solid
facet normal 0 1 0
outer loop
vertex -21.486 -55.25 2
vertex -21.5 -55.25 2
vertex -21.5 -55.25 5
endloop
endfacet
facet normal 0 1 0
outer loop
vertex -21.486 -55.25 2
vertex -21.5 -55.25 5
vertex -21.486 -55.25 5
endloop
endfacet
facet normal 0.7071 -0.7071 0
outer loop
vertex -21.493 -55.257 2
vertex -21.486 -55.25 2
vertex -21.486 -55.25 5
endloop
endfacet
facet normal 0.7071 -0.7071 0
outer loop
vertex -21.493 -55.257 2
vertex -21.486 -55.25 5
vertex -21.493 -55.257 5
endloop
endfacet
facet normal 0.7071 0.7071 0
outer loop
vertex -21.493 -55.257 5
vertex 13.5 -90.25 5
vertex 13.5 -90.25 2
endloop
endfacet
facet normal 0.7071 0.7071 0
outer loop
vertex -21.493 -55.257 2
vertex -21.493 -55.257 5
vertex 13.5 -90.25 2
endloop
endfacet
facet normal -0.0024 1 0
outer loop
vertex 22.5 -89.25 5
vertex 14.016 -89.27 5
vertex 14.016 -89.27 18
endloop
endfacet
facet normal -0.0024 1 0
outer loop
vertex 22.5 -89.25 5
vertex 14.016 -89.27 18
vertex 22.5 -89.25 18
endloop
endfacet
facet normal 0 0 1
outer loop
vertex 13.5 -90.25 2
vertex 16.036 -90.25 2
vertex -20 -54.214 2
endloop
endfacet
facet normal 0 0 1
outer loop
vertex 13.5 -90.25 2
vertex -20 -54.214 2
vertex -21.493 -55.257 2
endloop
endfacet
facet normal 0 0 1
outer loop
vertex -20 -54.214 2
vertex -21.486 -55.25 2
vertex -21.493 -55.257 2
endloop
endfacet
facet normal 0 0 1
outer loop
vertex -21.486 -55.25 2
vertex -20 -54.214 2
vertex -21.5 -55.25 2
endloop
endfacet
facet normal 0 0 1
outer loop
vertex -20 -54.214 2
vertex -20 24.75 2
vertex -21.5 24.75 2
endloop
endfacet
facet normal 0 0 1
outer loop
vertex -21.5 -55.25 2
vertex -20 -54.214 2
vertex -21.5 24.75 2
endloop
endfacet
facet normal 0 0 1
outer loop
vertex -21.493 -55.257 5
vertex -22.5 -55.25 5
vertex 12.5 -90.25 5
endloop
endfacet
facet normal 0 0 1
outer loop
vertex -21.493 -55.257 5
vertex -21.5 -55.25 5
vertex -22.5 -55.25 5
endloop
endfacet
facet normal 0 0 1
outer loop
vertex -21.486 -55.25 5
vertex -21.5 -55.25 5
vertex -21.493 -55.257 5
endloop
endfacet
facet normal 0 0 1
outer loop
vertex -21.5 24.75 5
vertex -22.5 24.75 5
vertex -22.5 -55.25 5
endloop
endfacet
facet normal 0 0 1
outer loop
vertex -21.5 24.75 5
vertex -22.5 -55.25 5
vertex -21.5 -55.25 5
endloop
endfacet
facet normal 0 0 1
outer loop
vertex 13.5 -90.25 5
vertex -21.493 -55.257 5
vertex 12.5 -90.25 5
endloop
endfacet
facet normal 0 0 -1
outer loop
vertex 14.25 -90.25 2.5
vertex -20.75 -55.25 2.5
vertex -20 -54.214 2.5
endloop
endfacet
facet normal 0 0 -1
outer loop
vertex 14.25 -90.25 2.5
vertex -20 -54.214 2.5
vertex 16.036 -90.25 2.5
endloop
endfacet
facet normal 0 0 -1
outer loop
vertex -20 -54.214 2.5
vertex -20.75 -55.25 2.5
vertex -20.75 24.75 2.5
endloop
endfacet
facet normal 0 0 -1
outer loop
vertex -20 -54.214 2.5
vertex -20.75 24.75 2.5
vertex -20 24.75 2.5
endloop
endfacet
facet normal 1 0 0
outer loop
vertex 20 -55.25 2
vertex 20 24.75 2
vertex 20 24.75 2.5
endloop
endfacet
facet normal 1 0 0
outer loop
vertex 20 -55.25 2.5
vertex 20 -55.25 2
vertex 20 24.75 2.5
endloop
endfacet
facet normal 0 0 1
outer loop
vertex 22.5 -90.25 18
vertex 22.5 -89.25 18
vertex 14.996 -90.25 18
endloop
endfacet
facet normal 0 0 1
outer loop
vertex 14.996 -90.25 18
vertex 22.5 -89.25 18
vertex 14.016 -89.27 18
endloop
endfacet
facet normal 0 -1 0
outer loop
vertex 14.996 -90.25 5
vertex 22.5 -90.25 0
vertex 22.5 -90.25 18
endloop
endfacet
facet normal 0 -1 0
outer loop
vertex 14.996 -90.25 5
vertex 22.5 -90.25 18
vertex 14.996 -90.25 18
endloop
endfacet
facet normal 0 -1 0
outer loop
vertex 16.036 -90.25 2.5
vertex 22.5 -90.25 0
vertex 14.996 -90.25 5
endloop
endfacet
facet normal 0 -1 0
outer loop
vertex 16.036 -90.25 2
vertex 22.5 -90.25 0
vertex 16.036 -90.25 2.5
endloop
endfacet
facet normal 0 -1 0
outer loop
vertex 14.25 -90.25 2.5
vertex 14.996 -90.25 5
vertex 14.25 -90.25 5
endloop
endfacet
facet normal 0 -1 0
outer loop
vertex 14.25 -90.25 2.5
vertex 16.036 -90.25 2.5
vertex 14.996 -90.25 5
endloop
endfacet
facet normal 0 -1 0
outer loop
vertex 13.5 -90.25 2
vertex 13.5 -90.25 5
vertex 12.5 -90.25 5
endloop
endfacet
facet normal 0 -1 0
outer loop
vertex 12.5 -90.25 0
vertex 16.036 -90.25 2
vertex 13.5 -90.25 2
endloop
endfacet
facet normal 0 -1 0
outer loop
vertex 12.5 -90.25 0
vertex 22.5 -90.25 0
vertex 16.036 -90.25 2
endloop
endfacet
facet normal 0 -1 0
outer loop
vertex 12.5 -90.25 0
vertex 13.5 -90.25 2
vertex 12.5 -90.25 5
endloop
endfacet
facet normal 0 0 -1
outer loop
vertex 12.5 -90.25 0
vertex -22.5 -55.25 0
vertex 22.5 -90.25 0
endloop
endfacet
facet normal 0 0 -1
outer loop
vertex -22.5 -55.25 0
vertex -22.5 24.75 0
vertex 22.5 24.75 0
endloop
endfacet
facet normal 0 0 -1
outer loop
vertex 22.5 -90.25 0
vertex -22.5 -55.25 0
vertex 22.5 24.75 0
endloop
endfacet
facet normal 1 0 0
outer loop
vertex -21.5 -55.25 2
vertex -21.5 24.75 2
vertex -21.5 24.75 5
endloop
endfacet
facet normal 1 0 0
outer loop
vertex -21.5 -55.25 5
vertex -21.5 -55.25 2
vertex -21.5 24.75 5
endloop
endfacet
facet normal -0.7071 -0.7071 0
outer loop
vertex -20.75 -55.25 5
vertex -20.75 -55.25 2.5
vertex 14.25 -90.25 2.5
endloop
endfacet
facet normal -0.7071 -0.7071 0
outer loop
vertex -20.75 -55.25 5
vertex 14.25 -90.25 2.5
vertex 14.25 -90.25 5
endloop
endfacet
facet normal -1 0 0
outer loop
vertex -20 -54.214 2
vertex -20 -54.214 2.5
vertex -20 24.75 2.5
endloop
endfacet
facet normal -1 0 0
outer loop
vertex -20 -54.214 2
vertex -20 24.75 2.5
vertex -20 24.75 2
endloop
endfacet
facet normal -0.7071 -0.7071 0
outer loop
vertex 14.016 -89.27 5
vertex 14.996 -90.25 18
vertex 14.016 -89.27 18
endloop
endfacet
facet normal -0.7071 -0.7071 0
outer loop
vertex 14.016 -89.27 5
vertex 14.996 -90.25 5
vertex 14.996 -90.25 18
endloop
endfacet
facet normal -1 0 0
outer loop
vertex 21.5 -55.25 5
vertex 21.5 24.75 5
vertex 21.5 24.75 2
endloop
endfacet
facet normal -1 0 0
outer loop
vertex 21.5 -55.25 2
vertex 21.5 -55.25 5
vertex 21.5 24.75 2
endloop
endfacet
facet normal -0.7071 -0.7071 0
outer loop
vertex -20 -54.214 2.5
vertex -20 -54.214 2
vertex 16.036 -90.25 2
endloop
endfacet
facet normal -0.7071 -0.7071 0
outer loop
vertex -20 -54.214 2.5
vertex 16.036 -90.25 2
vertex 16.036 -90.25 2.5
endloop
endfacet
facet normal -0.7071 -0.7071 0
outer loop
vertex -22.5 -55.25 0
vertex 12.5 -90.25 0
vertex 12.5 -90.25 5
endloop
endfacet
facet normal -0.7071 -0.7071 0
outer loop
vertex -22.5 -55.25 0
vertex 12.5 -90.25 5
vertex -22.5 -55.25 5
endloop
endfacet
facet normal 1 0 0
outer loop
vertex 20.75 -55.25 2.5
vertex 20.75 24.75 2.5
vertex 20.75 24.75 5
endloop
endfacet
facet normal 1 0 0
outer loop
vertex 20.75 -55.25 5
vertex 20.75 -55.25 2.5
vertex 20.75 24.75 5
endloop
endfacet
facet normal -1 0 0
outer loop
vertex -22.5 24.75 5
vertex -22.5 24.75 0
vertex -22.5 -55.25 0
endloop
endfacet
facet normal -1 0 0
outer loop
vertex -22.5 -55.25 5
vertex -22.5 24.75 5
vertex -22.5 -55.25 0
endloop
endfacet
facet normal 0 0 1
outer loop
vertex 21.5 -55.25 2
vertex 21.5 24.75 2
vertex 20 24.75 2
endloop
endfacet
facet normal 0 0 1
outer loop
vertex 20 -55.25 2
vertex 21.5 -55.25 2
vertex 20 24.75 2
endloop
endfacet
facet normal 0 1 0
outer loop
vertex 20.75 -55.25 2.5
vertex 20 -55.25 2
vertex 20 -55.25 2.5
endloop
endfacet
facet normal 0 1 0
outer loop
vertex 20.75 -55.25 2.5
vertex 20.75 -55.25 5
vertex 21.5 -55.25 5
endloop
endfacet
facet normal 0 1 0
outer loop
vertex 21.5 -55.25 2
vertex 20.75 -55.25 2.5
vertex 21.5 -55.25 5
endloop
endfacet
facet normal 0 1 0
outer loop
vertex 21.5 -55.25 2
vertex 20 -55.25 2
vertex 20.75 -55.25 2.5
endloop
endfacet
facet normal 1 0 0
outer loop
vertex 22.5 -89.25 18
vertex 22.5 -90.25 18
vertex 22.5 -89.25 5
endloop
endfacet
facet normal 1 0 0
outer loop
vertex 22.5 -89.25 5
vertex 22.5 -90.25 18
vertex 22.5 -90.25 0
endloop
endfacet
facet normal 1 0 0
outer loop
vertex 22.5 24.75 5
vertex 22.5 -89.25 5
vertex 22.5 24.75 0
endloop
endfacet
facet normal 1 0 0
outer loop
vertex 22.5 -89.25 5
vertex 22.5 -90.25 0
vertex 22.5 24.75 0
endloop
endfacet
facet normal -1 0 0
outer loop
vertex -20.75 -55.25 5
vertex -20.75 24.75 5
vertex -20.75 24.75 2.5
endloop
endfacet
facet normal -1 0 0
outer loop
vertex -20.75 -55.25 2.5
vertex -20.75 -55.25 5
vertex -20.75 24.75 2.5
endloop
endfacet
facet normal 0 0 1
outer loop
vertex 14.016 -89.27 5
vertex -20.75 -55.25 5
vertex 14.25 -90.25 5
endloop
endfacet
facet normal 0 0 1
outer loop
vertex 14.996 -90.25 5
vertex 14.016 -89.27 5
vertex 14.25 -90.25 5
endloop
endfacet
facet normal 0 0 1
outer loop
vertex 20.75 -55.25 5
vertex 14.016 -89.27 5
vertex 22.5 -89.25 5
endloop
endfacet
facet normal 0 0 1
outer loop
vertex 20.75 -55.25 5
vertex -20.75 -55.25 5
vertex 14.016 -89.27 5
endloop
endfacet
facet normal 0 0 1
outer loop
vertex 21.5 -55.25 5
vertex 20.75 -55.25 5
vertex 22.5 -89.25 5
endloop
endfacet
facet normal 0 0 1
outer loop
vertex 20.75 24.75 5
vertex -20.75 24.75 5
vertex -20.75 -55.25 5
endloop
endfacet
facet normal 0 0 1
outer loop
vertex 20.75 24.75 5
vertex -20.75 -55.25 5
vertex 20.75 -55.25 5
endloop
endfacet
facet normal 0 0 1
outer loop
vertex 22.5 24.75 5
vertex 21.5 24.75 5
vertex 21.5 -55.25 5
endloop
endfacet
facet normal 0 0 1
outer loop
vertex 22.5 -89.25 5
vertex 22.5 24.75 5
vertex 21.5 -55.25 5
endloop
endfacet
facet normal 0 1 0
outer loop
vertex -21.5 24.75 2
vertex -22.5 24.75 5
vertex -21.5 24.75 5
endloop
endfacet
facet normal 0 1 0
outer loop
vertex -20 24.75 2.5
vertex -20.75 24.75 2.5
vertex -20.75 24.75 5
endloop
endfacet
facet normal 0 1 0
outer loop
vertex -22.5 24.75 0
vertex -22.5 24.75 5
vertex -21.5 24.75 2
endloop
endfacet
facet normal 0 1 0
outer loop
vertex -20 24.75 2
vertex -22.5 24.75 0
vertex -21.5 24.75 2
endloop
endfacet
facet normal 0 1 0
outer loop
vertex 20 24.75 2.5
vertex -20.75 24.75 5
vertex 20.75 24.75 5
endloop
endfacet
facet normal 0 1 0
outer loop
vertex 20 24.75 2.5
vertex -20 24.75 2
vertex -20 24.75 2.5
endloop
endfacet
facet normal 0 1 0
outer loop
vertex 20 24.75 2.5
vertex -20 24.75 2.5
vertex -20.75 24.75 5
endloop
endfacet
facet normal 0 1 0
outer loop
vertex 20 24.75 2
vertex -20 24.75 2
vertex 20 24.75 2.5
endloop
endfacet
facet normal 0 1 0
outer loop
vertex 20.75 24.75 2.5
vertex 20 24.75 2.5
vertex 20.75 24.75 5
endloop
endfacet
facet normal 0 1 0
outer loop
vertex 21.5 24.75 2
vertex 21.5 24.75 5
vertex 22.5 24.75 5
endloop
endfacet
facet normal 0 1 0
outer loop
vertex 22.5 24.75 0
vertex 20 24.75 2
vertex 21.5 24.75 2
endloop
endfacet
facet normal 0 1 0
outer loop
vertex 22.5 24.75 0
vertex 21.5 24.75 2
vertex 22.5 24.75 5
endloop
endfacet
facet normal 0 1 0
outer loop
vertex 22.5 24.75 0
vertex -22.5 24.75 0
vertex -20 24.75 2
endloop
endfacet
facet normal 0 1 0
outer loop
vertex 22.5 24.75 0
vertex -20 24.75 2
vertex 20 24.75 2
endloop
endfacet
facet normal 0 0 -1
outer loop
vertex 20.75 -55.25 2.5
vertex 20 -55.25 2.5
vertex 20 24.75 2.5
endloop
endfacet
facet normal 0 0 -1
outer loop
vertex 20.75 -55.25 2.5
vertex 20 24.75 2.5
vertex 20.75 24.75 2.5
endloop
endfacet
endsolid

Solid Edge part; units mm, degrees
sketch "Sketch1" plane through (0, 0, 0) normal (0, 0, 1) x (1, 0, 0)
  line L0 (22.5, -55.25) -> (22.5, 24.75)
  line L1 (-22.5, 24.75) -> (22.5, 24.75)
  line L2 (-22.5, 24.75) -> (-22.5, -55.25)
  line L3 (-22.5, -55.25) -> (22.5, -55.25)
extrude "Protrusion1" add sketch "Sketch1" along normal blind 5
sketch "Sketch2" plane through (0, 55.25, 2.5) normal (0, 1, 0) x (-1, 0, 0)
  line L0 (-20.75, 0) -> (-20.75, 2.5)
  line L1 (-20.75, 2.5) -> (-21.5, 2.5)
  line L2 (-21.5, 2.5) -> (-21.5, -0.5)
  line L3 (-21.5, -0.5) -> (-20, -0.5)
  line L4 (-20, -0.5) -> (-20, 0)
  line L5 (-20, 0) -> (-20.75, 0)
extrude "Cutout1" cut sketch "Sketch2" against normal blind 110.5
mirror "Mirror1" about plane through (0, -55.25, 5) normal (1, 0, 0) of "Cutout1"
sketch "Sketch3" plane through (0, 0, 0) normal (0, 0, -1) x (1, 0, 0)
  line L0 (12.5, 90.25) -> (-22.5, 55.25)
  line L1 (-22.5, 55.25) -> (22.5, 55.25)
  line L2 (22.5, 55.25) -> (22.5, 90.25)
  line L3 (22.5, 90.25) -> (12.5, 90.25)
extrude "Protrusion2" add sketch "Sketch3" against normal blind 5
sketch "Sketch4" plane through (30, -72.75, 2.5) normal (-0.7071, 0.7071, 0) x (0, 0, -1)
  line L0 (-2.5, 24.0416) -> (0.5, 24.0416)
  line L1 (0.5, 24.0416) -> (0.5, 22.2487)
  line L2 (0.5, 22.2487) -> (0, 22.2487)
  line L3 (0, 22.2487) -> (0, 23.5113)
  line L4 (0, 23.5113) -> (-2.5, 23.5113)
  line L5 (-2.5, 23.5113) -> (-2.5, 24.0416)
extrude "Cutout3" cut sketch "Sketch4" along normal blind 48.7806
sketch "Sketch5" plane through (30, -72.75, 2.5) normal (-0.7071, 0.7071, 0) x (0, 0, -1)
  line L0 (-2.5, 23.5113) -> (-2.5, 24.0416)
  line L1 (-2.5, 24.0416) -> (0.5, 24.0416)
  line L2 (0.5, 24.0416) -> (0.5, 22.2487)
  line L3 (0.5, 22.2487) -> (0, 22.2487)
  line L4 (0, 22.2487) -> (0, 23.5113)
  line L5 (0, 23.5113) -> (-2.5, 23.5113)
extrude "Vyříznutí_4" cut sketch "Sketch5" against normal blind 2.7044
sketch "Sketch6" plane through (0.875, -32.75, 5) normal (0, 0, 1) x (0, 1, 0)
  line L0 (-56.5202, -13.1407) -> (-56.5, -21.625)
  line L1 (-57.5, -21.625) -> (-56.5, -21.625)
  line L2 (-57.5, -21.625) -> (-57.5, -15.1605)
  line L3 (-57.5, -15.1605) -> (-57.5, -14.1205)
  line L4 (-57.5, -14.1205) -> (-56.5202, -13.1407)
extrude "Protrusion3" add sketch "Sketch6" along normal blind 13
